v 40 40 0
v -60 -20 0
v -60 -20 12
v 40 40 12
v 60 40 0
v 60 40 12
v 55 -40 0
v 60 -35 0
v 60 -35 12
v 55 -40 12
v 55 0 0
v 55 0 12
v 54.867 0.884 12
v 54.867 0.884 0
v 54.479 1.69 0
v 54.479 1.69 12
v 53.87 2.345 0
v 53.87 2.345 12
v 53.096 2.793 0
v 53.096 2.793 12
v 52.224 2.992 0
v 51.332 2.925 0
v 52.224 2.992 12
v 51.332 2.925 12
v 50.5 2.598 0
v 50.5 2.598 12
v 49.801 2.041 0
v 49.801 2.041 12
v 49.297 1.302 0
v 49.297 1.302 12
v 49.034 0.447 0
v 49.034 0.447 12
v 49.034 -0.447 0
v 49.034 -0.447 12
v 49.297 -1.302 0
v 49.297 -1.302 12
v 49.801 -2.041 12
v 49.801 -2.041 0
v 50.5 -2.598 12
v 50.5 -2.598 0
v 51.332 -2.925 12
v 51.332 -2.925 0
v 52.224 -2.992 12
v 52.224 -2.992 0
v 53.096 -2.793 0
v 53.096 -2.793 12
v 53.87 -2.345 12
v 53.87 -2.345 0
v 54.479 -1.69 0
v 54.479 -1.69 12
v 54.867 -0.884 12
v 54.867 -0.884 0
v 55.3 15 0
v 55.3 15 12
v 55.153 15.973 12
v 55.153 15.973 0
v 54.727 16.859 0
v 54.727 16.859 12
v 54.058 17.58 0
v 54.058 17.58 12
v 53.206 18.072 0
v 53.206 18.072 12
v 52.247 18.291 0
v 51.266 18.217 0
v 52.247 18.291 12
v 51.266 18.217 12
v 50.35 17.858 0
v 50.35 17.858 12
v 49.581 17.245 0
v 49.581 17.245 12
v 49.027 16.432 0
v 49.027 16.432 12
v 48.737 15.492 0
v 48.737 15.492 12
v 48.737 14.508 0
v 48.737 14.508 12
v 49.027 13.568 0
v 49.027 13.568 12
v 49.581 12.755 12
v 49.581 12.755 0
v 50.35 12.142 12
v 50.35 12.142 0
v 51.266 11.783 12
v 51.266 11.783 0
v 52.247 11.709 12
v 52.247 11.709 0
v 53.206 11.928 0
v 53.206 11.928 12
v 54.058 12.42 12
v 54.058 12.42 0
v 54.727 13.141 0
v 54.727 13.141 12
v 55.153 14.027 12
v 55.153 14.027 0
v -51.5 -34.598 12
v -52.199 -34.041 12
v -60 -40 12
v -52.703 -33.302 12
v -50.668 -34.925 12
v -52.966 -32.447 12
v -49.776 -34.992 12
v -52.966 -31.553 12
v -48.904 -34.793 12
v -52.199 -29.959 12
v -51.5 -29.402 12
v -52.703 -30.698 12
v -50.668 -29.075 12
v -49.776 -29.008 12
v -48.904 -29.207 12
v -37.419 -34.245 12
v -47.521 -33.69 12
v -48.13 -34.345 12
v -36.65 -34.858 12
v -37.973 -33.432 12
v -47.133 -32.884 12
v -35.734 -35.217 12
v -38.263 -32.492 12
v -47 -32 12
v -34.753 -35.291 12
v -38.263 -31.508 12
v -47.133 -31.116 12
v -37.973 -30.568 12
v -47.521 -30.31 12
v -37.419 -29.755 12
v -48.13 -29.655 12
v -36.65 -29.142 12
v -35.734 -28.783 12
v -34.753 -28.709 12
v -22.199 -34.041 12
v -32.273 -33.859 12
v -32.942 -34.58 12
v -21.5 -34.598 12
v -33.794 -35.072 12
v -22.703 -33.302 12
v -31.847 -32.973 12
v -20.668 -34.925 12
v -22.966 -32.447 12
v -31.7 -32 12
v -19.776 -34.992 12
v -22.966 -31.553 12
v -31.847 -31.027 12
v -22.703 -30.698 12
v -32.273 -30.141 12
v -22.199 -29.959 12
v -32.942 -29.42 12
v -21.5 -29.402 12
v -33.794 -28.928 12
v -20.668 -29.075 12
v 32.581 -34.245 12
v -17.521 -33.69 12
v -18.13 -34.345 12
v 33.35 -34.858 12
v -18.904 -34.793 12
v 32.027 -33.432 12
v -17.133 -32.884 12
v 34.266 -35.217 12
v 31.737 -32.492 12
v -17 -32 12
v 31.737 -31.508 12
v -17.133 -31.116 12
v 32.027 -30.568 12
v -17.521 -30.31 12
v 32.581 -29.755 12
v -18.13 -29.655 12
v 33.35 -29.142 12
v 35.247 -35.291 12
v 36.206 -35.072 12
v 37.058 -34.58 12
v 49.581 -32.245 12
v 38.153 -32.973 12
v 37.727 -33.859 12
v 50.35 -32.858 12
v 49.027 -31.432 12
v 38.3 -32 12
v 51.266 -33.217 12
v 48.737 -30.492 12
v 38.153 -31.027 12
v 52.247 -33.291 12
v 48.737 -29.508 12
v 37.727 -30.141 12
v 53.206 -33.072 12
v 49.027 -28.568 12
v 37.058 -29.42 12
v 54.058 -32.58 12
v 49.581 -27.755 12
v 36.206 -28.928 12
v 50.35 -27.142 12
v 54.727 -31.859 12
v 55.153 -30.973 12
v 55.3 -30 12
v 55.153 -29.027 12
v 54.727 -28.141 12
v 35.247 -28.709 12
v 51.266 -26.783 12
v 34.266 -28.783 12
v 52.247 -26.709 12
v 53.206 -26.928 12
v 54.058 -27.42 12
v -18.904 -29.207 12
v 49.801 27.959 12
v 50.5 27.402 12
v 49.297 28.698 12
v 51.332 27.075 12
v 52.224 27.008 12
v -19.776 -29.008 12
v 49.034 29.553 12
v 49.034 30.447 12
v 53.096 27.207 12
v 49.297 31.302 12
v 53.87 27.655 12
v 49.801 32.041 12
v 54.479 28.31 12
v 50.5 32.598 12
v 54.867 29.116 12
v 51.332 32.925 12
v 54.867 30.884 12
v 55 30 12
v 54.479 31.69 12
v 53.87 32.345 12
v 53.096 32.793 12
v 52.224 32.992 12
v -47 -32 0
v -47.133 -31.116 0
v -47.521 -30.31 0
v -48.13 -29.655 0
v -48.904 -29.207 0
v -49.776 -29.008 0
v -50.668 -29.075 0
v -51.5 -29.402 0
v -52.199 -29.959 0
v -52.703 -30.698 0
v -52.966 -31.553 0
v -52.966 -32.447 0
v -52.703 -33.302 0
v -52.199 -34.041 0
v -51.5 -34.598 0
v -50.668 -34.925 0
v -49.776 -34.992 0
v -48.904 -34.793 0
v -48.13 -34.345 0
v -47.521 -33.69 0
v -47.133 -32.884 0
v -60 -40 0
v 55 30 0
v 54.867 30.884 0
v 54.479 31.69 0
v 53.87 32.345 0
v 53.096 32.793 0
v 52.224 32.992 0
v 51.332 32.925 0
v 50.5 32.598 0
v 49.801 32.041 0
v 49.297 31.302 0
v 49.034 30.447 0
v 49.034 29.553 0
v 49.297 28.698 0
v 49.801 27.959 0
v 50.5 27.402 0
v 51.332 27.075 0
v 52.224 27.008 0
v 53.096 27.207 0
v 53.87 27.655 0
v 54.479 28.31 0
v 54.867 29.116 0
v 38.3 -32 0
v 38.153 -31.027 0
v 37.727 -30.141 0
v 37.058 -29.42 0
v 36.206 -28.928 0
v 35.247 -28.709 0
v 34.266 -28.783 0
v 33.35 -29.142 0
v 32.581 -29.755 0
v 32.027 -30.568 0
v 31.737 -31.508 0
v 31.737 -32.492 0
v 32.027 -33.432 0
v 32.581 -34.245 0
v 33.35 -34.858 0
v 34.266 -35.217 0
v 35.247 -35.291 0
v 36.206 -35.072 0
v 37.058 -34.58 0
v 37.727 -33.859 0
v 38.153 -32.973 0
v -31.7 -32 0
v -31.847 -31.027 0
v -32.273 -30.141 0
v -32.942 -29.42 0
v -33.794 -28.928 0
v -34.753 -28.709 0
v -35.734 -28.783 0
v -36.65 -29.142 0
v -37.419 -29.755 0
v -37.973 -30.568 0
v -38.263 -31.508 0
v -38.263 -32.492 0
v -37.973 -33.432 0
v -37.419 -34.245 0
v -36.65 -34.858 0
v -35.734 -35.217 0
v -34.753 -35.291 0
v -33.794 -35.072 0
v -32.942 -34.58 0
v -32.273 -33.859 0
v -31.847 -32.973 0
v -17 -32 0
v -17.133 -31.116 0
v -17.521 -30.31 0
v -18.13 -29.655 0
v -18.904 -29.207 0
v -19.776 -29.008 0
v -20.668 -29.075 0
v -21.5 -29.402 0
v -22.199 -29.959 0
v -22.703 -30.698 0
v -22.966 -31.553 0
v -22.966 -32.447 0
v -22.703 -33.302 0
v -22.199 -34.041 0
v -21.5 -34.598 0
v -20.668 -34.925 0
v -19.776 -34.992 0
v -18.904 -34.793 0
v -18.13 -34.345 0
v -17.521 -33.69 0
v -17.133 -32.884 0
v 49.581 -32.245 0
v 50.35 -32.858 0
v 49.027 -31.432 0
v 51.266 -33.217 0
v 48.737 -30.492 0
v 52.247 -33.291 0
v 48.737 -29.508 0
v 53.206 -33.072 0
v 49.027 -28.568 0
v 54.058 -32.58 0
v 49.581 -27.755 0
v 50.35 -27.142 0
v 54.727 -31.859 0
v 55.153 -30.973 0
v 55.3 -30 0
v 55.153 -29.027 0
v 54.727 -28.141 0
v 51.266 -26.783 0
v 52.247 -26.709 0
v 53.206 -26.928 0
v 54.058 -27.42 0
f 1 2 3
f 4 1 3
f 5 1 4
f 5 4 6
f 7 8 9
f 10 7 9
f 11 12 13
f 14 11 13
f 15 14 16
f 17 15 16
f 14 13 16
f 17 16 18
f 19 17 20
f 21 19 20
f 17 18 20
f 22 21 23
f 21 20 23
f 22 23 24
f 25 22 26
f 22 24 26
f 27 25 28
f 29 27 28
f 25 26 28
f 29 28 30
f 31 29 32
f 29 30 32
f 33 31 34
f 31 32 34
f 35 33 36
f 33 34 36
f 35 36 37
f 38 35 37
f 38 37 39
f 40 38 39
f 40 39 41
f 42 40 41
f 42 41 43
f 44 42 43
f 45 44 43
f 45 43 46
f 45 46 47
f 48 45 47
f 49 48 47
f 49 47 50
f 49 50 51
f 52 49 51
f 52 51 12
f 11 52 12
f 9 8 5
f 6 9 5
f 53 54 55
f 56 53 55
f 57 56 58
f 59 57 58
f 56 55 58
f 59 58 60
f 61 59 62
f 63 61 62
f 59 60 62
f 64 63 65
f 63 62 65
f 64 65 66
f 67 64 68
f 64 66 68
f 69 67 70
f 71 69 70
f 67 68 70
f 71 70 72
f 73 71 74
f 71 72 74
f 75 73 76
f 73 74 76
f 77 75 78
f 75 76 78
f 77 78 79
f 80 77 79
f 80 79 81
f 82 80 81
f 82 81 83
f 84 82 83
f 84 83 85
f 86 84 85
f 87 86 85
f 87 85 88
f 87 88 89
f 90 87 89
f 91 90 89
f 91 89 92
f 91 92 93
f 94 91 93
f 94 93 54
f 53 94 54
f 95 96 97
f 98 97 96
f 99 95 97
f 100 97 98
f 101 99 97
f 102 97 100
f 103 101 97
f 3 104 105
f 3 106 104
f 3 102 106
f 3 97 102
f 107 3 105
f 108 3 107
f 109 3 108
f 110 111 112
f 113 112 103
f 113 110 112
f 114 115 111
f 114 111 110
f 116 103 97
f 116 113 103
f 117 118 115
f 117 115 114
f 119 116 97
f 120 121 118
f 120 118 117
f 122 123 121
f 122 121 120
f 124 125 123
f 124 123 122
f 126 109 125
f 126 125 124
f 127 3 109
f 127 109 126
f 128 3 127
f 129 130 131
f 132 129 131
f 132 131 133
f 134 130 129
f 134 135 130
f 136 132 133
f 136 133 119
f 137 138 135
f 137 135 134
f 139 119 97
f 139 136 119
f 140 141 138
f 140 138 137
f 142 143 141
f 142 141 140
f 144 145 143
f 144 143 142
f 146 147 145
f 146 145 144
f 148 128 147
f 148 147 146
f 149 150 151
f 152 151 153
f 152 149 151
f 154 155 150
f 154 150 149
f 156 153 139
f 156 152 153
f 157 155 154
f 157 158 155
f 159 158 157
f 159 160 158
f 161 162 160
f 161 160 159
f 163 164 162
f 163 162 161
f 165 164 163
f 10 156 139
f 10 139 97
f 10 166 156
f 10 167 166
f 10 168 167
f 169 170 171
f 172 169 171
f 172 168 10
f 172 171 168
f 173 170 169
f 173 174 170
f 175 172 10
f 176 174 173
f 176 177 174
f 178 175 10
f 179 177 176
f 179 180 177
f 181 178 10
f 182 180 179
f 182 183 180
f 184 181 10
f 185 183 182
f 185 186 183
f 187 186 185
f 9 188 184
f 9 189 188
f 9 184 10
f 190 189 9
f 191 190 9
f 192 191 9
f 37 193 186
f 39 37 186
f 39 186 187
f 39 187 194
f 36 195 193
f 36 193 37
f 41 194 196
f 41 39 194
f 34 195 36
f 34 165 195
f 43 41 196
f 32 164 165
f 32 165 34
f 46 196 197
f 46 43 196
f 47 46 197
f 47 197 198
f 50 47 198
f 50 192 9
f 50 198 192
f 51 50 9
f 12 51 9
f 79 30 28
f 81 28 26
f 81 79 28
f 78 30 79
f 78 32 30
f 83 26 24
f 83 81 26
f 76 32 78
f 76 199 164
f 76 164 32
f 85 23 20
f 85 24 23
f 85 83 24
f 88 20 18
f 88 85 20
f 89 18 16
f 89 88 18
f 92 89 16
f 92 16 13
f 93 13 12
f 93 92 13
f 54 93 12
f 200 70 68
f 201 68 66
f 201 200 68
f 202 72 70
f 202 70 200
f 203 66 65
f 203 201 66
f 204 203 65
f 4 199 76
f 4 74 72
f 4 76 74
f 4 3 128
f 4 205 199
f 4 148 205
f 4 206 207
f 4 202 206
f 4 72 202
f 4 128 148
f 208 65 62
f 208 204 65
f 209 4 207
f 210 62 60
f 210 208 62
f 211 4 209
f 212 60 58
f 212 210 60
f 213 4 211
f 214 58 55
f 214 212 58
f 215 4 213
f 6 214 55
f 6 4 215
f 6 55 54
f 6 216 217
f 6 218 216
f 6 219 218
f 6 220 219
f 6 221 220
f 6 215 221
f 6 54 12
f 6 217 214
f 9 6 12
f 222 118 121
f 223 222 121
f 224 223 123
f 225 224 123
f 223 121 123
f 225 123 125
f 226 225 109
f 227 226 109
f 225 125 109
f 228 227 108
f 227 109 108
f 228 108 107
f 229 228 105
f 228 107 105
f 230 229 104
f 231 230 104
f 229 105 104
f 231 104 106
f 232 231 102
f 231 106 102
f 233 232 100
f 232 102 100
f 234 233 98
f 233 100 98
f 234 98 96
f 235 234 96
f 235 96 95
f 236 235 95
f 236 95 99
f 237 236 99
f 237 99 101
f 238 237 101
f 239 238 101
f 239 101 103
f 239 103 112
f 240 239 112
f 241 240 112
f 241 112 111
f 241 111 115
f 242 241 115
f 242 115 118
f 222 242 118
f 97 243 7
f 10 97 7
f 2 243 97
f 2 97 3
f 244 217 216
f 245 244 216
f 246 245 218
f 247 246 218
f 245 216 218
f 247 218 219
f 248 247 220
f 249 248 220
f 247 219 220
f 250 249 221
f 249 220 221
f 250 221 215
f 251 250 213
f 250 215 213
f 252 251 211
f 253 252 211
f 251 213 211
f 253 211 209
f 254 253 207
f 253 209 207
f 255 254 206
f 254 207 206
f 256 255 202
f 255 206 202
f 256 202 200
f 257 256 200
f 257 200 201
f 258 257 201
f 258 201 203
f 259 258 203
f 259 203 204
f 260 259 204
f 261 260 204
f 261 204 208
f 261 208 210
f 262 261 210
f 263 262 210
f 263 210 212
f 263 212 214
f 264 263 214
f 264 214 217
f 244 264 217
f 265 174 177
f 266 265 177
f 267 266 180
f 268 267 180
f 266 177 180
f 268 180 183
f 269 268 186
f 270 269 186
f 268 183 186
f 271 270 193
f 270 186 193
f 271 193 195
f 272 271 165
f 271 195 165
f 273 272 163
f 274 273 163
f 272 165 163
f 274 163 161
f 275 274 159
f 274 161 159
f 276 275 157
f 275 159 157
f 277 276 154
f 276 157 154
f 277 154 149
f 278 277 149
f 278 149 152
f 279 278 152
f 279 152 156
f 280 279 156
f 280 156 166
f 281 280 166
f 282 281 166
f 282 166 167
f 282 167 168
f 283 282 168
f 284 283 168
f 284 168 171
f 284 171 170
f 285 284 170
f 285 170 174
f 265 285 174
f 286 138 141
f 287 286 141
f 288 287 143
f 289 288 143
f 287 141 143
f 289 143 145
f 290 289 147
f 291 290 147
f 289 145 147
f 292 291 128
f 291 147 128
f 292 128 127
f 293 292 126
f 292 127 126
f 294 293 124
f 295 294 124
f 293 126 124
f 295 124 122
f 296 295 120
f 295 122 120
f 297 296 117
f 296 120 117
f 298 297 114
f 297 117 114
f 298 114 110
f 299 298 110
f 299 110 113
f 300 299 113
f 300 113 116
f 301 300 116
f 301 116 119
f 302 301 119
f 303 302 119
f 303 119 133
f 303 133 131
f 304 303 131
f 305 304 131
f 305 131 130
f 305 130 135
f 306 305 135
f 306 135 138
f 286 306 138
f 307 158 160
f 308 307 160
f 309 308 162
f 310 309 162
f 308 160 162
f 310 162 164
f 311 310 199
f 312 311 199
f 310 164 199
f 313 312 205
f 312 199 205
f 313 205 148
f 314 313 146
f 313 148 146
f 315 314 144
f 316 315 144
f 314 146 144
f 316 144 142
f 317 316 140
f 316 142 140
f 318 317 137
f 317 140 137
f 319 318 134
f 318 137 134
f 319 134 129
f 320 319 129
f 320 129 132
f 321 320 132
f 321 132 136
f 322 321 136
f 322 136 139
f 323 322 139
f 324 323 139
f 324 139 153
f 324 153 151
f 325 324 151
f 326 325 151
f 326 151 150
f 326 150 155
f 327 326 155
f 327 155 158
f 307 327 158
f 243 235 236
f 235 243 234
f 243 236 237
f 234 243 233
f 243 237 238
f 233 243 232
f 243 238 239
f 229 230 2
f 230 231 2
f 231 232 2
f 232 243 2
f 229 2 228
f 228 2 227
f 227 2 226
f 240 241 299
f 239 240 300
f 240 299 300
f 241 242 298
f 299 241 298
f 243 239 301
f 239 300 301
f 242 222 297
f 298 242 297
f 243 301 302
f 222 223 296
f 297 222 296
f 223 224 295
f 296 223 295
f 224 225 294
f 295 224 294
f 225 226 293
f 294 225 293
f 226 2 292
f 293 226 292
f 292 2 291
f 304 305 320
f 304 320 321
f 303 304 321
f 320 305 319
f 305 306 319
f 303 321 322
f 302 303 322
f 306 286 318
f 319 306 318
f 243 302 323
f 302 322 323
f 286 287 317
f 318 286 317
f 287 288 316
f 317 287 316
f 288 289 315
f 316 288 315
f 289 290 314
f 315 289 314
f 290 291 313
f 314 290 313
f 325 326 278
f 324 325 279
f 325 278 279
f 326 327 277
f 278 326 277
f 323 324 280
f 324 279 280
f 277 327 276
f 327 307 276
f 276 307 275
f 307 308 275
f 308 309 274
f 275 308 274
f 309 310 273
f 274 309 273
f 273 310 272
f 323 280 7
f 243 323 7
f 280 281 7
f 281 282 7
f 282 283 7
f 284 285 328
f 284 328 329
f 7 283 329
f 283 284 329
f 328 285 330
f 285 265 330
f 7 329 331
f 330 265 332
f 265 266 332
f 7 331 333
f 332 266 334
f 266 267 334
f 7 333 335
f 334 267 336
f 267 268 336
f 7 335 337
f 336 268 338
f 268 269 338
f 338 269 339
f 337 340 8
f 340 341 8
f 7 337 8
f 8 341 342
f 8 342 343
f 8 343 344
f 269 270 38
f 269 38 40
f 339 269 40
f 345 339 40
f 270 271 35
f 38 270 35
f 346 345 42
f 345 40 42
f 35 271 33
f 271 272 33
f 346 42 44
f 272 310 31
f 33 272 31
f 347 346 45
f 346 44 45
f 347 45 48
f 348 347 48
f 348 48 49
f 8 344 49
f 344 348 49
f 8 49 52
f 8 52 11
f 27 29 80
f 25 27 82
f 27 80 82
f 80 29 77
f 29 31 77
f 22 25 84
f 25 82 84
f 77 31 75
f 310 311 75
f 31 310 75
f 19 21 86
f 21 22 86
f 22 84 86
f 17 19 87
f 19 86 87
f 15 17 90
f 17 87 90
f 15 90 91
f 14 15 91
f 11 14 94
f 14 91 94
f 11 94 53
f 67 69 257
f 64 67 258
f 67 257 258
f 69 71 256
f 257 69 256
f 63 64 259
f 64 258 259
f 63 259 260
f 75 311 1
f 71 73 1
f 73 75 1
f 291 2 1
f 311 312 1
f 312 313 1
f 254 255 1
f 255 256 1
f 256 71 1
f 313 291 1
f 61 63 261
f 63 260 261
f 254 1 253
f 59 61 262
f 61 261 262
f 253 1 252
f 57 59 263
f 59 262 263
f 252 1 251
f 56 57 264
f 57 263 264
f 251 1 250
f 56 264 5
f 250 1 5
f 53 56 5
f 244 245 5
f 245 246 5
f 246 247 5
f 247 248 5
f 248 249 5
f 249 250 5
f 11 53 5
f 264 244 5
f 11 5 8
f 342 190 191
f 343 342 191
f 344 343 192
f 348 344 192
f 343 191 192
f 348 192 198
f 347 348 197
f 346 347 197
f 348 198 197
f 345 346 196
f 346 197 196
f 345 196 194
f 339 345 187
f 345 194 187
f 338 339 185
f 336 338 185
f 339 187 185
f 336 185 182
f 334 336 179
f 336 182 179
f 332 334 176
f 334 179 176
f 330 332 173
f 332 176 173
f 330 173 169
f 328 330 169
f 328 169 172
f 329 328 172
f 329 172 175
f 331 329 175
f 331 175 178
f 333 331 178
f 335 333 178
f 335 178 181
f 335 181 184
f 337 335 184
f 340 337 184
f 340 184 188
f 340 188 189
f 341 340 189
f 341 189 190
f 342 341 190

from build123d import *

# Parameters (mm, degrees)
SKETCH_1_W         = 120
SKETCH_1_H         = 80
EXTRUDE_1_DEPTH    = 12
CHAMFER_1_SIZE     = 100
CHAMFER_1_SIZE2    = 60
CHAMFER_2_SIZE     = 5
MM_1_D             = 6
HOLE_WIZARD_M6_1_D = 6.6


with BuildPart() as part:
    # 草图1 → 凸台-拉伸1 (new body)
    with BuildSketch(Plane.XY):
        Rectangle(SKETCH_1_W, SKETCH_1_H)
    extrude(amount=EXTRUDE_1_DEPTH)

    # 倒角1
    chamfer_1_edges = [part.edges().sort_by_distance(p)[0] for p in [
        (-60, 40, 6),
    ]]
    chamfer_1_side = [part.faces().sort_by_distance(p)[0] for p in [
        (0, 40, 6),
    ]]
    chamfer(chamfer_1_edges, length=CHAMFER_1_SIZE, length2=CHAMFER_1_SIZE2, reference=chamfer_1_side[0])

    # 倒角2
    chamfer_2_edges = [part.edges().sort_by_distance(p)[0] for p in [
        (60, -40, 6),
    ]]
    chamfer(chamfer_2_edges, length=CHAMFER_2_SIZE)

    # 大小mm 暗销孔1 (through all)
    with Locations(Plane(origin=(0, 0, 0), x_dir=(-1, 0, 0), z_dir=(0, 0, -1))):
        with Locations((50, -32), (20, -32), (-52, 30), (-52, 0)):
            Hole(MM_1_D / 2)

    # M6 间隙孔1 (through all)
    with Locations(Plane(origin=(0, 0, 0), x_dir=(-1, 0, 0), z_dir=(0, 0, -1))):
        with Locations((-52, 15), (-52, -30), (-35, -32), (35, -32)):
            Hole(HOLE_WIZARD_M6_1_D / 2)


solid = part.part
